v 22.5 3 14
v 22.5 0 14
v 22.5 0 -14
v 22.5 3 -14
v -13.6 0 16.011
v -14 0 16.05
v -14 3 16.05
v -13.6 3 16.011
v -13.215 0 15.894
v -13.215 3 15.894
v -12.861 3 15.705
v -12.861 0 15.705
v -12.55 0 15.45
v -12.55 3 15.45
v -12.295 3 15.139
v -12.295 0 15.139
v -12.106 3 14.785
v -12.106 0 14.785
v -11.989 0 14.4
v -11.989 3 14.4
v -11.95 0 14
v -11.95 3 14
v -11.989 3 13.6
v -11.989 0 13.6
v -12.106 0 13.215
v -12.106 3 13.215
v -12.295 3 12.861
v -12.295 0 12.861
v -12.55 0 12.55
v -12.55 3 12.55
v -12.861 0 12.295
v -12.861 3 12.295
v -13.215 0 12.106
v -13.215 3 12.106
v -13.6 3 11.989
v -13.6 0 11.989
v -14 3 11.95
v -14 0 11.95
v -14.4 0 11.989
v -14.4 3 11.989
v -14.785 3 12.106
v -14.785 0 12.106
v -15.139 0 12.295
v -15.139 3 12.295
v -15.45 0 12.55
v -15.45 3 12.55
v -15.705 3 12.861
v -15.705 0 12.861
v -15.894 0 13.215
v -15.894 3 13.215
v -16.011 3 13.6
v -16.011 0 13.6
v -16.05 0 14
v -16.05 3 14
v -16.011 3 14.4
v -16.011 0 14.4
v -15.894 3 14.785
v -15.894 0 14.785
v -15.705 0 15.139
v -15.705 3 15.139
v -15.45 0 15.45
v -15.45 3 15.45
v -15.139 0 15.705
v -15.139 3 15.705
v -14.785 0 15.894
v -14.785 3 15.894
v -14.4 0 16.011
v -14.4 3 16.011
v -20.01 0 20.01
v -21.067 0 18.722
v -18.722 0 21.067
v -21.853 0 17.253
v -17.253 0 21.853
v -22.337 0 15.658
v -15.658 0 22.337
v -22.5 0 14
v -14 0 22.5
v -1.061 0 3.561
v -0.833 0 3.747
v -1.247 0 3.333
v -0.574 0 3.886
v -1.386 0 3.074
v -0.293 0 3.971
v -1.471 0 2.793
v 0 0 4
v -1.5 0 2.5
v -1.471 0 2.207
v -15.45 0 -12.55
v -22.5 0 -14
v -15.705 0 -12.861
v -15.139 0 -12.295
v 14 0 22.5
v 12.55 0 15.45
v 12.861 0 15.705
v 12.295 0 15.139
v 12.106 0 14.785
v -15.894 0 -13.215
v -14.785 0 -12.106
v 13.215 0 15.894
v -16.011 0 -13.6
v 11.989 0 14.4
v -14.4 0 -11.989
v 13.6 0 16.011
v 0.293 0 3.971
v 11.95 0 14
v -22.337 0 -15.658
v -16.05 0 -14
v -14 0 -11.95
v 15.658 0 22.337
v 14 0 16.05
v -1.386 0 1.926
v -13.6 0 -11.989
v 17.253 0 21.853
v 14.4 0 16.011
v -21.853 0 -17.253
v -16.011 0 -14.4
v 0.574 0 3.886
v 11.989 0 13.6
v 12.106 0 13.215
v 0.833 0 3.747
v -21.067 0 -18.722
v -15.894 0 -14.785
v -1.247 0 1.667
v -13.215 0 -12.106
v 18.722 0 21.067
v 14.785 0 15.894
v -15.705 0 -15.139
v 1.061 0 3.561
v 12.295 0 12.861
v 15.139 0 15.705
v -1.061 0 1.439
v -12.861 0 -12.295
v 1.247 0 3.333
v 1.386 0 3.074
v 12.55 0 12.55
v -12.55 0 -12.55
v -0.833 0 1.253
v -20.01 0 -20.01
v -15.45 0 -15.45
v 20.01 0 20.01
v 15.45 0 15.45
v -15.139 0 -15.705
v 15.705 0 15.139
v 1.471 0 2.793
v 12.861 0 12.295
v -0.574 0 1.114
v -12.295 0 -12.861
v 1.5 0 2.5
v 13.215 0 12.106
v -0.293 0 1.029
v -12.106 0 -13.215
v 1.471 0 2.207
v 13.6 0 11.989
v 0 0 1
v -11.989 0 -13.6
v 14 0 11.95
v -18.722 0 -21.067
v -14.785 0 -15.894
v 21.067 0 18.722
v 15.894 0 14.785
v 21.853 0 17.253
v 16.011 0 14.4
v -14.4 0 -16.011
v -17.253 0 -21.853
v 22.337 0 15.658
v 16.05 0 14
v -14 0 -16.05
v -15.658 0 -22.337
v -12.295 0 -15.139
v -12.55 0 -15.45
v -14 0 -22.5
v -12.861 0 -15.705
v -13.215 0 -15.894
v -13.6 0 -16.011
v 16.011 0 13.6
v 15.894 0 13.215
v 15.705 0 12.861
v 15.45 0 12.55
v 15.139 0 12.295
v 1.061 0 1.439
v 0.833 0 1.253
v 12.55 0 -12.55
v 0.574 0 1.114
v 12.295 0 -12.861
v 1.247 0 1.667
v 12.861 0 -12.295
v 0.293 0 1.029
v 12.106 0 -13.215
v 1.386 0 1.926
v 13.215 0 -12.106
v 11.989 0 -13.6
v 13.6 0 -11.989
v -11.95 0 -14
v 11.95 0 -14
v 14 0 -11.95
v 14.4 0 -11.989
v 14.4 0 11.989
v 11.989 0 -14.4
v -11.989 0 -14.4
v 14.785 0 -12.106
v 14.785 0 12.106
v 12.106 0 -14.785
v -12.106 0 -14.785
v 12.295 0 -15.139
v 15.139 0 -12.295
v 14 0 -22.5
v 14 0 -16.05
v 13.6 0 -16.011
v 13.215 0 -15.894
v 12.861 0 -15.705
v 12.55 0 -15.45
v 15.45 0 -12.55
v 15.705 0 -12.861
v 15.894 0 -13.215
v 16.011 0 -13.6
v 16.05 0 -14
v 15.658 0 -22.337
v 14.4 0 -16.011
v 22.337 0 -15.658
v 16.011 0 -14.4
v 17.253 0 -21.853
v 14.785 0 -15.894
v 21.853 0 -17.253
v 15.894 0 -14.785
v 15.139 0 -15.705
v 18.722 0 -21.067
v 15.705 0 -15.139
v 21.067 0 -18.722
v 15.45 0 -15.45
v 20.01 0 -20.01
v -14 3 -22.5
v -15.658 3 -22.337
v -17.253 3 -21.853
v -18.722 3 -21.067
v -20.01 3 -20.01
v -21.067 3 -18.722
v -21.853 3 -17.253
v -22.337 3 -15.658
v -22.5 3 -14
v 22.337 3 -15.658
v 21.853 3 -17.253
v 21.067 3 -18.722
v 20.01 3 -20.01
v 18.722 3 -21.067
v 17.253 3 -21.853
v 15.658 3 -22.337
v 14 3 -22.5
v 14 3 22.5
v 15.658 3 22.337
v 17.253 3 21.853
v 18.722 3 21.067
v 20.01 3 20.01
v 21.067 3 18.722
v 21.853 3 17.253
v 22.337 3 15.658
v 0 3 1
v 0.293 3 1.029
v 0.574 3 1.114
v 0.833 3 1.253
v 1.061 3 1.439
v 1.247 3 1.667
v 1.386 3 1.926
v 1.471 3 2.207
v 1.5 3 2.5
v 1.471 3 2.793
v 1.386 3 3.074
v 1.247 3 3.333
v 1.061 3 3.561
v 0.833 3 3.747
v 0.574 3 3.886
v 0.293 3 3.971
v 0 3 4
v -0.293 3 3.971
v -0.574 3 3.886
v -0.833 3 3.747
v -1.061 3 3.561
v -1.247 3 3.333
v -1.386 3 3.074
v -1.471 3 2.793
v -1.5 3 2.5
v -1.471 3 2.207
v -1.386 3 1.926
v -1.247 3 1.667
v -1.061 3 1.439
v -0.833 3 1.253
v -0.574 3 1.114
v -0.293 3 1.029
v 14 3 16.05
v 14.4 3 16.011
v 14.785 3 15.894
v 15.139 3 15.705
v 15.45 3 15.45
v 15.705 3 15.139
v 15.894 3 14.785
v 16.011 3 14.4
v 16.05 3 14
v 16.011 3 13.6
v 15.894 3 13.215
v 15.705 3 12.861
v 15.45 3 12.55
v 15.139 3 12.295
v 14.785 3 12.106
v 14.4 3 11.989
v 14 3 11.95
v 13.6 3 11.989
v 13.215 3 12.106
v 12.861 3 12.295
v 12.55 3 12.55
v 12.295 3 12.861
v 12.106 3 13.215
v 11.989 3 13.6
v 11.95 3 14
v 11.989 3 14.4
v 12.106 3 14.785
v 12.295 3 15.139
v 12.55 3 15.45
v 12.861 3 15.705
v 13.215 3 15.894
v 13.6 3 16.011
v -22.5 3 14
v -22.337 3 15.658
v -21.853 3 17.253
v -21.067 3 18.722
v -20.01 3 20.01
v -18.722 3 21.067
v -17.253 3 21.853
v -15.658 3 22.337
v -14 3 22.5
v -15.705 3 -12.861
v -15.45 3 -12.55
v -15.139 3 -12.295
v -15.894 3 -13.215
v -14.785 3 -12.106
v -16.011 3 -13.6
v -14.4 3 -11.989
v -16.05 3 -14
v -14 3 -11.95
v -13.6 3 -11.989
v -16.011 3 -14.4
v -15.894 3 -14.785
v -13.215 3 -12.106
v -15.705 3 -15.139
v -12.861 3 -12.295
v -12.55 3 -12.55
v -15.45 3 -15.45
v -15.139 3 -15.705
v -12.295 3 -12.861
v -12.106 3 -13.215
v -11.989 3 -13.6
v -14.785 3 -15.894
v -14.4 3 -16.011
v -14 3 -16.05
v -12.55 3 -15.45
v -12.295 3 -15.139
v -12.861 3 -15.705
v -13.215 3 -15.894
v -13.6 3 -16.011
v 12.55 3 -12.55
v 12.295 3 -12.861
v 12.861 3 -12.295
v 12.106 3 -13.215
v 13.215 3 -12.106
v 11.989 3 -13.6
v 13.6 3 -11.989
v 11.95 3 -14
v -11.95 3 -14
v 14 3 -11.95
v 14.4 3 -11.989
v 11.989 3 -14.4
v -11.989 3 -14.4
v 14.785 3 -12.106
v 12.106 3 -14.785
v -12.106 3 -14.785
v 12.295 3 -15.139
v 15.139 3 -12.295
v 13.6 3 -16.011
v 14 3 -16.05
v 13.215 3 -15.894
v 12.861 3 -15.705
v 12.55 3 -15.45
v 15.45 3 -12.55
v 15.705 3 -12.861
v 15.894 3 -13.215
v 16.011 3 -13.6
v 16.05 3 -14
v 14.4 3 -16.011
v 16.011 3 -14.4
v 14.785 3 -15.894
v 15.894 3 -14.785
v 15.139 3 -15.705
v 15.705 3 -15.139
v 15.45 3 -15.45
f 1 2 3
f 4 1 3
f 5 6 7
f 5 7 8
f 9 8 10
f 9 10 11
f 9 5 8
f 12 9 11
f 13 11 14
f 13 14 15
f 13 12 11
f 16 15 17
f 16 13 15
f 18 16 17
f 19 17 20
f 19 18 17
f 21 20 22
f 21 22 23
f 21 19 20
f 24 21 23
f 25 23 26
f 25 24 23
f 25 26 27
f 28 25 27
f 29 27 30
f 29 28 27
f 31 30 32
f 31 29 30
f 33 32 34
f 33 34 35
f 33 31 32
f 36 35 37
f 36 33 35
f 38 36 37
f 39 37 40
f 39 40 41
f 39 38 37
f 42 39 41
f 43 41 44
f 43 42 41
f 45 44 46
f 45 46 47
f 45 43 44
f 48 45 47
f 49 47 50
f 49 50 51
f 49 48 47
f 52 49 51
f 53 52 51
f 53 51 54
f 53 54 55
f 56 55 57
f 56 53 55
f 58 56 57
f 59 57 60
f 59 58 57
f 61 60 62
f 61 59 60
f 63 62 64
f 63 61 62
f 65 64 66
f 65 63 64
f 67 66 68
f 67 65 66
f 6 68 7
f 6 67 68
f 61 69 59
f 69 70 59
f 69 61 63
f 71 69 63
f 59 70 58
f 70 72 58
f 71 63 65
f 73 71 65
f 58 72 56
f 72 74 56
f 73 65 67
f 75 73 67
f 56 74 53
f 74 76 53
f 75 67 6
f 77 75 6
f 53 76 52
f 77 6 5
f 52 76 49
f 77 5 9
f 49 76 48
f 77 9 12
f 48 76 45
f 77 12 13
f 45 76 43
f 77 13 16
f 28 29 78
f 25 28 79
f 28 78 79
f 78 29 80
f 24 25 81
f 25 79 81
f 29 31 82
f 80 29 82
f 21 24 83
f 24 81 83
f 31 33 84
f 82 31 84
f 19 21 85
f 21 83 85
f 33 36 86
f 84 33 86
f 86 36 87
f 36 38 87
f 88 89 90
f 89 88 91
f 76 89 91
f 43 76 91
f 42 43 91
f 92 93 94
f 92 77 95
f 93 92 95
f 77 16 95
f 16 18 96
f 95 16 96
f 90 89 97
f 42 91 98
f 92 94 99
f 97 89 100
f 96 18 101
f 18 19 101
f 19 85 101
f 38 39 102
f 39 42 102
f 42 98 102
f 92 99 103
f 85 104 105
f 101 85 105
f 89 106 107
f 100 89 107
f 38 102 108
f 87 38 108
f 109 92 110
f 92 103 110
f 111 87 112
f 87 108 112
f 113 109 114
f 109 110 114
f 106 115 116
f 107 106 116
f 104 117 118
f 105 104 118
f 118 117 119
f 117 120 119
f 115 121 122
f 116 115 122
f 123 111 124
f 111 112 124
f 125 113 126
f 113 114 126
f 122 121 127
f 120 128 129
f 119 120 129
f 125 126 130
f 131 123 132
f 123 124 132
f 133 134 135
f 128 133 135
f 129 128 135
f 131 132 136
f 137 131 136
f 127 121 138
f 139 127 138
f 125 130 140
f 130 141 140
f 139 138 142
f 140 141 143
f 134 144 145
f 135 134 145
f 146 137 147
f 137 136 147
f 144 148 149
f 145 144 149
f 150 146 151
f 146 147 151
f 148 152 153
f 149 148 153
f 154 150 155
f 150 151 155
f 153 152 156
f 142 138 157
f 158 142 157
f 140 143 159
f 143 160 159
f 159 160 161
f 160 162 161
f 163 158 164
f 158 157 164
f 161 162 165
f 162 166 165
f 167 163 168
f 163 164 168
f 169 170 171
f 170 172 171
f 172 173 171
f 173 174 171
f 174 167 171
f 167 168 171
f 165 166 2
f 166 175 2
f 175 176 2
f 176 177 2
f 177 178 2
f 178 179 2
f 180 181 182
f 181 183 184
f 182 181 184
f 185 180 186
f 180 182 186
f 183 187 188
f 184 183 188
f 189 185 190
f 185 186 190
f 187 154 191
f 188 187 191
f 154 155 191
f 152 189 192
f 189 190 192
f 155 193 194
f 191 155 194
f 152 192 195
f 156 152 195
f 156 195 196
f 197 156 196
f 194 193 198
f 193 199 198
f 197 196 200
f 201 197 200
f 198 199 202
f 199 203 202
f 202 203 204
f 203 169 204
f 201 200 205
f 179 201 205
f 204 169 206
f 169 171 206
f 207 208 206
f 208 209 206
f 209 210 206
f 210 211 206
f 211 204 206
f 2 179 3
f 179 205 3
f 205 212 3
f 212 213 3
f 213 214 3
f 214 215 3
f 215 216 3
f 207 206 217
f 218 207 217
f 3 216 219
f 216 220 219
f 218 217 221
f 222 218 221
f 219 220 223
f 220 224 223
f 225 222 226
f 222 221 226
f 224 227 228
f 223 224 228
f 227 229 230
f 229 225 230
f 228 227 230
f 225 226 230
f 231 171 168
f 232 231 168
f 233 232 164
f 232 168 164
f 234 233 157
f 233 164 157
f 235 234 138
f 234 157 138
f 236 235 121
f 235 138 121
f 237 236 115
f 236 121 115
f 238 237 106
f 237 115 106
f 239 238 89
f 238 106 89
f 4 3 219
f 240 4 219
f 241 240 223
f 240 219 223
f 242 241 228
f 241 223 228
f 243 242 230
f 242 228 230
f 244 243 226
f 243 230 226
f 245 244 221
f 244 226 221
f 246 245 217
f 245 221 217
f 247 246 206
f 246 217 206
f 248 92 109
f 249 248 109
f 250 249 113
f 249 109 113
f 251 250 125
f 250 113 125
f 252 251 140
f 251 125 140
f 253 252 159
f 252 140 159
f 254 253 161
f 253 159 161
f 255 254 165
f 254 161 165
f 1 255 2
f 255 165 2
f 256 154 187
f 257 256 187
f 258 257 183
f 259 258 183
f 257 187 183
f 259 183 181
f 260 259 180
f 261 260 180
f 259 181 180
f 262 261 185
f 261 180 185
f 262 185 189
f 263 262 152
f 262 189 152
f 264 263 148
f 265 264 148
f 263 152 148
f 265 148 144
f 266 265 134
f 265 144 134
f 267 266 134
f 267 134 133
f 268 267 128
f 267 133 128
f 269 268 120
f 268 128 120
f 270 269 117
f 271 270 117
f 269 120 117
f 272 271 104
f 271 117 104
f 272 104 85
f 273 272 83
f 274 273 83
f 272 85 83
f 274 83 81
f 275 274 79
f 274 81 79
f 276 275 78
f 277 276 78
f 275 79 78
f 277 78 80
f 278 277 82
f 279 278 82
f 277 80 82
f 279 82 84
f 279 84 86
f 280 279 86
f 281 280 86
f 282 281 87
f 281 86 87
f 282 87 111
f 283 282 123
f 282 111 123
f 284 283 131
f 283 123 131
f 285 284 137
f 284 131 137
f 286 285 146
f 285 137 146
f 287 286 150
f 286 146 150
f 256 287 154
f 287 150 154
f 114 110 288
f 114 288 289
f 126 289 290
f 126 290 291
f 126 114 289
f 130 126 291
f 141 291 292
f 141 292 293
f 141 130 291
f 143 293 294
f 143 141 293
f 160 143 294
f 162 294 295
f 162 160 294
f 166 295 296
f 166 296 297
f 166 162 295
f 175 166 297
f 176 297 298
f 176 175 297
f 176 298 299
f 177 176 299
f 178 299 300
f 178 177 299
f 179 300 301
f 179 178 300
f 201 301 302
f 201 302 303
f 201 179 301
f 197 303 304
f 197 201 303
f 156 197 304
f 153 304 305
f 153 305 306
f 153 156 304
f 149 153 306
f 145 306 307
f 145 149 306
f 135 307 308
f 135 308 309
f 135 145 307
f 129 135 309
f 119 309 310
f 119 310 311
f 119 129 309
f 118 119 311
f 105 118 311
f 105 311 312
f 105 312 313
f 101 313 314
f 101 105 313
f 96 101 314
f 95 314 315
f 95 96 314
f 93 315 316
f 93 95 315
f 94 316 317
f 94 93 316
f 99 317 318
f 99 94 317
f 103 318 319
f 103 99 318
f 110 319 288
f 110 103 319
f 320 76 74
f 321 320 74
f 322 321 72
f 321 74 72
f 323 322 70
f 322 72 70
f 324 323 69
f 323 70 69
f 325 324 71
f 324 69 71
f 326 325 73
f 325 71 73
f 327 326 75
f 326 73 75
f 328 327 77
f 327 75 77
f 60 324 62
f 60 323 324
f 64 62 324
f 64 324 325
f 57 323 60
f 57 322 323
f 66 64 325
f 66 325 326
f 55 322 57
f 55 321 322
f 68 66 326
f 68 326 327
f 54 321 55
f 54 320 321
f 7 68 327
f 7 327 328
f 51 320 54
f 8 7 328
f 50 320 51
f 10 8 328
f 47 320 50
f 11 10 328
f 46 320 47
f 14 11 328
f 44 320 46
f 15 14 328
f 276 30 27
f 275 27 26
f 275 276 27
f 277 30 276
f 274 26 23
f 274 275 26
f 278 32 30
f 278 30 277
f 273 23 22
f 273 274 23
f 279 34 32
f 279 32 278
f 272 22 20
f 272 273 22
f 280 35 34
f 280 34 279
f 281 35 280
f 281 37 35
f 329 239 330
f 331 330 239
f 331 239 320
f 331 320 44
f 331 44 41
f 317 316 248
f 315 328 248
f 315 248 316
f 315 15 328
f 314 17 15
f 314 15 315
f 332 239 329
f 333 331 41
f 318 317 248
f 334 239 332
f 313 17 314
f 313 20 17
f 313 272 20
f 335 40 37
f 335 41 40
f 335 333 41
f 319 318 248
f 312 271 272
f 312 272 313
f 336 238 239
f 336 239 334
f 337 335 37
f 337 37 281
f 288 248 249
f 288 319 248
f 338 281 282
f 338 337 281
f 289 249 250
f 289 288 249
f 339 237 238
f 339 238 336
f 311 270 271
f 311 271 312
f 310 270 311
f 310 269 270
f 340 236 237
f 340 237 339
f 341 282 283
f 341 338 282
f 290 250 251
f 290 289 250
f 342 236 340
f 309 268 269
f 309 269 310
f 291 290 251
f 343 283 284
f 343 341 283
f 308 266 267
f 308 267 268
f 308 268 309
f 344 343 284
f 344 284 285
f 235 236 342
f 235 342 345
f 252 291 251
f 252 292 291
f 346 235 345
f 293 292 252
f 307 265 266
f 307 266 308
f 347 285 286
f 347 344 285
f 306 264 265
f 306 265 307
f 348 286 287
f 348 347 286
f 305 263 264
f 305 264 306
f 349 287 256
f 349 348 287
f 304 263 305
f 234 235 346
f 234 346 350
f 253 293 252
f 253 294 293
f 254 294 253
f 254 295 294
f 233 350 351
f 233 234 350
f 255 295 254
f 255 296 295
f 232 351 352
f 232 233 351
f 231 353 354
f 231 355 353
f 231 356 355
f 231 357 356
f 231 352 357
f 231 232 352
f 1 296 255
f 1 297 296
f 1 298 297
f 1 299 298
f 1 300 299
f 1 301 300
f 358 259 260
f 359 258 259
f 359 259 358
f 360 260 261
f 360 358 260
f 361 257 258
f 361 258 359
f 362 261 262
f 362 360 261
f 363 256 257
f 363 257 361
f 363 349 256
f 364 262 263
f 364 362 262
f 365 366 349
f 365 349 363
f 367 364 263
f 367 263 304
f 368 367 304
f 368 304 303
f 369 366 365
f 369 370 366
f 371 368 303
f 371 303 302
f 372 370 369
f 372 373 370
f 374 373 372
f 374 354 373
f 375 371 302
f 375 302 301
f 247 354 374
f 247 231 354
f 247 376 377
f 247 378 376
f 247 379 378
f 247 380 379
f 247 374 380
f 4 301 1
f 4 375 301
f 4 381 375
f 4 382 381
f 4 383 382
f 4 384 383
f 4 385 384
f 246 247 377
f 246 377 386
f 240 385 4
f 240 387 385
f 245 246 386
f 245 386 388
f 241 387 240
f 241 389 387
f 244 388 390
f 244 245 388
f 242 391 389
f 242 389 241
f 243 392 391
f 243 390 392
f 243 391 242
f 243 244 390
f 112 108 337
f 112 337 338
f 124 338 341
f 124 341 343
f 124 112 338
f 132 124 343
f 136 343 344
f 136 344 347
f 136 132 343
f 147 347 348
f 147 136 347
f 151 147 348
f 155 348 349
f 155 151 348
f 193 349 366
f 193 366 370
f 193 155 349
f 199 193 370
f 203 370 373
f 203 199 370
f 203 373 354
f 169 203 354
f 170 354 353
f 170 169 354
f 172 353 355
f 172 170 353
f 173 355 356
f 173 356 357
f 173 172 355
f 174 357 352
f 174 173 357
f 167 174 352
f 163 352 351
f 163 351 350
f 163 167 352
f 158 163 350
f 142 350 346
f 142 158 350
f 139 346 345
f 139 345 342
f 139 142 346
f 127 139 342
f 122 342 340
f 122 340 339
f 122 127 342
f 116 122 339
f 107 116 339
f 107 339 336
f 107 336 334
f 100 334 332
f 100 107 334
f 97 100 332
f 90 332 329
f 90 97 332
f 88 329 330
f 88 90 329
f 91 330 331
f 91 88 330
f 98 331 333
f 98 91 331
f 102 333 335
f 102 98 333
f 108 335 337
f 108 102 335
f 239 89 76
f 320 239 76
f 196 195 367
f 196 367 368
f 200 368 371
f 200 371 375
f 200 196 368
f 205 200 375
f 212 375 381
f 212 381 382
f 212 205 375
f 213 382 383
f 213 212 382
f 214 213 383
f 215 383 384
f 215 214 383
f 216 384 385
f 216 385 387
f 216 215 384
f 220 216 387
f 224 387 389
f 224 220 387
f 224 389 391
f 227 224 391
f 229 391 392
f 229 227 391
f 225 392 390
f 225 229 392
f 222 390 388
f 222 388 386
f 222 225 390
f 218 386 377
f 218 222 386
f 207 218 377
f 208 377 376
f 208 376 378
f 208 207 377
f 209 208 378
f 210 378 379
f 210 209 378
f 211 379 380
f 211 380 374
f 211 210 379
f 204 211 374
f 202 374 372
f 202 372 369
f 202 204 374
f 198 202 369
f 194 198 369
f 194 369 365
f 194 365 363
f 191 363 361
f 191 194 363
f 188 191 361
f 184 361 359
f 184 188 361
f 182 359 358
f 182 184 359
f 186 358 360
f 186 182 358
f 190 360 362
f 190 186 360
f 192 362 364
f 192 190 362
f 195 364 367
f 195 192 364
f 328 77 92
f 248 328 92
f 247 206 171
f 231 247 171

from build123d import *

# Parameters (mm, degrees)
SKETCH_1_R          = 2.05
EXTRUDE_1_DEPTH     = 3
SKETCH_2_R          = 1.5
CUT_EXTRUDE_1_DEPTH = 3


with BuildPart() as part:
    # Эскиз1 → Бобышка-Вытянуть1 (new body)
    with BuildSketch(Plane(origin=(0, 0, 0), x_dir=(1, 0, 0), z_dir=(0, 1, 0))):
        with BuildLine():
            Line((-14, -22.5), (14, -22.5))
            ThreePointArc((14, -22.5), (20.01040764, -20.01040764), (22.5, -14))
            Line((22.5, -14), (22.5, 14))
            ThreePointArc((22.5, 14), (20.01040764, 20.01040764), (14, 22.5))
            Line((14, 22.5), (-14, 22.5))
            ThreePointArc((-14, 22.5), (-20.01040764, 20.01040764), (-22.5, 14))
            Line((-22.5, 14), (-22.5, -14))
            ThreePointArc((-22.5, -14), (-20.01040764, -20.01040764), (-14, -22.5))
        make_face()
        with Locations(Location((14, 14, 0), (0, 0, 270))):
            Circle(SKETCH_1_R, mode=Mode.SUBTRACT)
        with Locations(Location((14, -14, 0), (0, 0, 270))):
            Circle(SKETCH_1_R, mode=Mode.SUBTRACT)
        with Locations(Location((-14, -14, 0), (0, 0, 270))):
            Circle(SKETCH_1_R, mode=Mode.SUBTRACT)
        with Locations(Location((-14, 14, 0), (0, 0, 270))):
            Circle(SKETCH_1_R, mode=Mode.SUBTRACT)
    extrude(amount=EXTRUDE_1_DEPTH)

    # Эскиз2 → Вырез-Вытянуть1 (cut)
    with BuildSketch(Plane.XZ):
        with Locations(Location((0, 2.5, 0), (0, 0, 270))):
            Circle(SKETCH_2_R)
    extrude(amount=-CUT_EXTRUDE_1_DEPTH, mode=Mode.SUBTRACT)


solid = part.part
